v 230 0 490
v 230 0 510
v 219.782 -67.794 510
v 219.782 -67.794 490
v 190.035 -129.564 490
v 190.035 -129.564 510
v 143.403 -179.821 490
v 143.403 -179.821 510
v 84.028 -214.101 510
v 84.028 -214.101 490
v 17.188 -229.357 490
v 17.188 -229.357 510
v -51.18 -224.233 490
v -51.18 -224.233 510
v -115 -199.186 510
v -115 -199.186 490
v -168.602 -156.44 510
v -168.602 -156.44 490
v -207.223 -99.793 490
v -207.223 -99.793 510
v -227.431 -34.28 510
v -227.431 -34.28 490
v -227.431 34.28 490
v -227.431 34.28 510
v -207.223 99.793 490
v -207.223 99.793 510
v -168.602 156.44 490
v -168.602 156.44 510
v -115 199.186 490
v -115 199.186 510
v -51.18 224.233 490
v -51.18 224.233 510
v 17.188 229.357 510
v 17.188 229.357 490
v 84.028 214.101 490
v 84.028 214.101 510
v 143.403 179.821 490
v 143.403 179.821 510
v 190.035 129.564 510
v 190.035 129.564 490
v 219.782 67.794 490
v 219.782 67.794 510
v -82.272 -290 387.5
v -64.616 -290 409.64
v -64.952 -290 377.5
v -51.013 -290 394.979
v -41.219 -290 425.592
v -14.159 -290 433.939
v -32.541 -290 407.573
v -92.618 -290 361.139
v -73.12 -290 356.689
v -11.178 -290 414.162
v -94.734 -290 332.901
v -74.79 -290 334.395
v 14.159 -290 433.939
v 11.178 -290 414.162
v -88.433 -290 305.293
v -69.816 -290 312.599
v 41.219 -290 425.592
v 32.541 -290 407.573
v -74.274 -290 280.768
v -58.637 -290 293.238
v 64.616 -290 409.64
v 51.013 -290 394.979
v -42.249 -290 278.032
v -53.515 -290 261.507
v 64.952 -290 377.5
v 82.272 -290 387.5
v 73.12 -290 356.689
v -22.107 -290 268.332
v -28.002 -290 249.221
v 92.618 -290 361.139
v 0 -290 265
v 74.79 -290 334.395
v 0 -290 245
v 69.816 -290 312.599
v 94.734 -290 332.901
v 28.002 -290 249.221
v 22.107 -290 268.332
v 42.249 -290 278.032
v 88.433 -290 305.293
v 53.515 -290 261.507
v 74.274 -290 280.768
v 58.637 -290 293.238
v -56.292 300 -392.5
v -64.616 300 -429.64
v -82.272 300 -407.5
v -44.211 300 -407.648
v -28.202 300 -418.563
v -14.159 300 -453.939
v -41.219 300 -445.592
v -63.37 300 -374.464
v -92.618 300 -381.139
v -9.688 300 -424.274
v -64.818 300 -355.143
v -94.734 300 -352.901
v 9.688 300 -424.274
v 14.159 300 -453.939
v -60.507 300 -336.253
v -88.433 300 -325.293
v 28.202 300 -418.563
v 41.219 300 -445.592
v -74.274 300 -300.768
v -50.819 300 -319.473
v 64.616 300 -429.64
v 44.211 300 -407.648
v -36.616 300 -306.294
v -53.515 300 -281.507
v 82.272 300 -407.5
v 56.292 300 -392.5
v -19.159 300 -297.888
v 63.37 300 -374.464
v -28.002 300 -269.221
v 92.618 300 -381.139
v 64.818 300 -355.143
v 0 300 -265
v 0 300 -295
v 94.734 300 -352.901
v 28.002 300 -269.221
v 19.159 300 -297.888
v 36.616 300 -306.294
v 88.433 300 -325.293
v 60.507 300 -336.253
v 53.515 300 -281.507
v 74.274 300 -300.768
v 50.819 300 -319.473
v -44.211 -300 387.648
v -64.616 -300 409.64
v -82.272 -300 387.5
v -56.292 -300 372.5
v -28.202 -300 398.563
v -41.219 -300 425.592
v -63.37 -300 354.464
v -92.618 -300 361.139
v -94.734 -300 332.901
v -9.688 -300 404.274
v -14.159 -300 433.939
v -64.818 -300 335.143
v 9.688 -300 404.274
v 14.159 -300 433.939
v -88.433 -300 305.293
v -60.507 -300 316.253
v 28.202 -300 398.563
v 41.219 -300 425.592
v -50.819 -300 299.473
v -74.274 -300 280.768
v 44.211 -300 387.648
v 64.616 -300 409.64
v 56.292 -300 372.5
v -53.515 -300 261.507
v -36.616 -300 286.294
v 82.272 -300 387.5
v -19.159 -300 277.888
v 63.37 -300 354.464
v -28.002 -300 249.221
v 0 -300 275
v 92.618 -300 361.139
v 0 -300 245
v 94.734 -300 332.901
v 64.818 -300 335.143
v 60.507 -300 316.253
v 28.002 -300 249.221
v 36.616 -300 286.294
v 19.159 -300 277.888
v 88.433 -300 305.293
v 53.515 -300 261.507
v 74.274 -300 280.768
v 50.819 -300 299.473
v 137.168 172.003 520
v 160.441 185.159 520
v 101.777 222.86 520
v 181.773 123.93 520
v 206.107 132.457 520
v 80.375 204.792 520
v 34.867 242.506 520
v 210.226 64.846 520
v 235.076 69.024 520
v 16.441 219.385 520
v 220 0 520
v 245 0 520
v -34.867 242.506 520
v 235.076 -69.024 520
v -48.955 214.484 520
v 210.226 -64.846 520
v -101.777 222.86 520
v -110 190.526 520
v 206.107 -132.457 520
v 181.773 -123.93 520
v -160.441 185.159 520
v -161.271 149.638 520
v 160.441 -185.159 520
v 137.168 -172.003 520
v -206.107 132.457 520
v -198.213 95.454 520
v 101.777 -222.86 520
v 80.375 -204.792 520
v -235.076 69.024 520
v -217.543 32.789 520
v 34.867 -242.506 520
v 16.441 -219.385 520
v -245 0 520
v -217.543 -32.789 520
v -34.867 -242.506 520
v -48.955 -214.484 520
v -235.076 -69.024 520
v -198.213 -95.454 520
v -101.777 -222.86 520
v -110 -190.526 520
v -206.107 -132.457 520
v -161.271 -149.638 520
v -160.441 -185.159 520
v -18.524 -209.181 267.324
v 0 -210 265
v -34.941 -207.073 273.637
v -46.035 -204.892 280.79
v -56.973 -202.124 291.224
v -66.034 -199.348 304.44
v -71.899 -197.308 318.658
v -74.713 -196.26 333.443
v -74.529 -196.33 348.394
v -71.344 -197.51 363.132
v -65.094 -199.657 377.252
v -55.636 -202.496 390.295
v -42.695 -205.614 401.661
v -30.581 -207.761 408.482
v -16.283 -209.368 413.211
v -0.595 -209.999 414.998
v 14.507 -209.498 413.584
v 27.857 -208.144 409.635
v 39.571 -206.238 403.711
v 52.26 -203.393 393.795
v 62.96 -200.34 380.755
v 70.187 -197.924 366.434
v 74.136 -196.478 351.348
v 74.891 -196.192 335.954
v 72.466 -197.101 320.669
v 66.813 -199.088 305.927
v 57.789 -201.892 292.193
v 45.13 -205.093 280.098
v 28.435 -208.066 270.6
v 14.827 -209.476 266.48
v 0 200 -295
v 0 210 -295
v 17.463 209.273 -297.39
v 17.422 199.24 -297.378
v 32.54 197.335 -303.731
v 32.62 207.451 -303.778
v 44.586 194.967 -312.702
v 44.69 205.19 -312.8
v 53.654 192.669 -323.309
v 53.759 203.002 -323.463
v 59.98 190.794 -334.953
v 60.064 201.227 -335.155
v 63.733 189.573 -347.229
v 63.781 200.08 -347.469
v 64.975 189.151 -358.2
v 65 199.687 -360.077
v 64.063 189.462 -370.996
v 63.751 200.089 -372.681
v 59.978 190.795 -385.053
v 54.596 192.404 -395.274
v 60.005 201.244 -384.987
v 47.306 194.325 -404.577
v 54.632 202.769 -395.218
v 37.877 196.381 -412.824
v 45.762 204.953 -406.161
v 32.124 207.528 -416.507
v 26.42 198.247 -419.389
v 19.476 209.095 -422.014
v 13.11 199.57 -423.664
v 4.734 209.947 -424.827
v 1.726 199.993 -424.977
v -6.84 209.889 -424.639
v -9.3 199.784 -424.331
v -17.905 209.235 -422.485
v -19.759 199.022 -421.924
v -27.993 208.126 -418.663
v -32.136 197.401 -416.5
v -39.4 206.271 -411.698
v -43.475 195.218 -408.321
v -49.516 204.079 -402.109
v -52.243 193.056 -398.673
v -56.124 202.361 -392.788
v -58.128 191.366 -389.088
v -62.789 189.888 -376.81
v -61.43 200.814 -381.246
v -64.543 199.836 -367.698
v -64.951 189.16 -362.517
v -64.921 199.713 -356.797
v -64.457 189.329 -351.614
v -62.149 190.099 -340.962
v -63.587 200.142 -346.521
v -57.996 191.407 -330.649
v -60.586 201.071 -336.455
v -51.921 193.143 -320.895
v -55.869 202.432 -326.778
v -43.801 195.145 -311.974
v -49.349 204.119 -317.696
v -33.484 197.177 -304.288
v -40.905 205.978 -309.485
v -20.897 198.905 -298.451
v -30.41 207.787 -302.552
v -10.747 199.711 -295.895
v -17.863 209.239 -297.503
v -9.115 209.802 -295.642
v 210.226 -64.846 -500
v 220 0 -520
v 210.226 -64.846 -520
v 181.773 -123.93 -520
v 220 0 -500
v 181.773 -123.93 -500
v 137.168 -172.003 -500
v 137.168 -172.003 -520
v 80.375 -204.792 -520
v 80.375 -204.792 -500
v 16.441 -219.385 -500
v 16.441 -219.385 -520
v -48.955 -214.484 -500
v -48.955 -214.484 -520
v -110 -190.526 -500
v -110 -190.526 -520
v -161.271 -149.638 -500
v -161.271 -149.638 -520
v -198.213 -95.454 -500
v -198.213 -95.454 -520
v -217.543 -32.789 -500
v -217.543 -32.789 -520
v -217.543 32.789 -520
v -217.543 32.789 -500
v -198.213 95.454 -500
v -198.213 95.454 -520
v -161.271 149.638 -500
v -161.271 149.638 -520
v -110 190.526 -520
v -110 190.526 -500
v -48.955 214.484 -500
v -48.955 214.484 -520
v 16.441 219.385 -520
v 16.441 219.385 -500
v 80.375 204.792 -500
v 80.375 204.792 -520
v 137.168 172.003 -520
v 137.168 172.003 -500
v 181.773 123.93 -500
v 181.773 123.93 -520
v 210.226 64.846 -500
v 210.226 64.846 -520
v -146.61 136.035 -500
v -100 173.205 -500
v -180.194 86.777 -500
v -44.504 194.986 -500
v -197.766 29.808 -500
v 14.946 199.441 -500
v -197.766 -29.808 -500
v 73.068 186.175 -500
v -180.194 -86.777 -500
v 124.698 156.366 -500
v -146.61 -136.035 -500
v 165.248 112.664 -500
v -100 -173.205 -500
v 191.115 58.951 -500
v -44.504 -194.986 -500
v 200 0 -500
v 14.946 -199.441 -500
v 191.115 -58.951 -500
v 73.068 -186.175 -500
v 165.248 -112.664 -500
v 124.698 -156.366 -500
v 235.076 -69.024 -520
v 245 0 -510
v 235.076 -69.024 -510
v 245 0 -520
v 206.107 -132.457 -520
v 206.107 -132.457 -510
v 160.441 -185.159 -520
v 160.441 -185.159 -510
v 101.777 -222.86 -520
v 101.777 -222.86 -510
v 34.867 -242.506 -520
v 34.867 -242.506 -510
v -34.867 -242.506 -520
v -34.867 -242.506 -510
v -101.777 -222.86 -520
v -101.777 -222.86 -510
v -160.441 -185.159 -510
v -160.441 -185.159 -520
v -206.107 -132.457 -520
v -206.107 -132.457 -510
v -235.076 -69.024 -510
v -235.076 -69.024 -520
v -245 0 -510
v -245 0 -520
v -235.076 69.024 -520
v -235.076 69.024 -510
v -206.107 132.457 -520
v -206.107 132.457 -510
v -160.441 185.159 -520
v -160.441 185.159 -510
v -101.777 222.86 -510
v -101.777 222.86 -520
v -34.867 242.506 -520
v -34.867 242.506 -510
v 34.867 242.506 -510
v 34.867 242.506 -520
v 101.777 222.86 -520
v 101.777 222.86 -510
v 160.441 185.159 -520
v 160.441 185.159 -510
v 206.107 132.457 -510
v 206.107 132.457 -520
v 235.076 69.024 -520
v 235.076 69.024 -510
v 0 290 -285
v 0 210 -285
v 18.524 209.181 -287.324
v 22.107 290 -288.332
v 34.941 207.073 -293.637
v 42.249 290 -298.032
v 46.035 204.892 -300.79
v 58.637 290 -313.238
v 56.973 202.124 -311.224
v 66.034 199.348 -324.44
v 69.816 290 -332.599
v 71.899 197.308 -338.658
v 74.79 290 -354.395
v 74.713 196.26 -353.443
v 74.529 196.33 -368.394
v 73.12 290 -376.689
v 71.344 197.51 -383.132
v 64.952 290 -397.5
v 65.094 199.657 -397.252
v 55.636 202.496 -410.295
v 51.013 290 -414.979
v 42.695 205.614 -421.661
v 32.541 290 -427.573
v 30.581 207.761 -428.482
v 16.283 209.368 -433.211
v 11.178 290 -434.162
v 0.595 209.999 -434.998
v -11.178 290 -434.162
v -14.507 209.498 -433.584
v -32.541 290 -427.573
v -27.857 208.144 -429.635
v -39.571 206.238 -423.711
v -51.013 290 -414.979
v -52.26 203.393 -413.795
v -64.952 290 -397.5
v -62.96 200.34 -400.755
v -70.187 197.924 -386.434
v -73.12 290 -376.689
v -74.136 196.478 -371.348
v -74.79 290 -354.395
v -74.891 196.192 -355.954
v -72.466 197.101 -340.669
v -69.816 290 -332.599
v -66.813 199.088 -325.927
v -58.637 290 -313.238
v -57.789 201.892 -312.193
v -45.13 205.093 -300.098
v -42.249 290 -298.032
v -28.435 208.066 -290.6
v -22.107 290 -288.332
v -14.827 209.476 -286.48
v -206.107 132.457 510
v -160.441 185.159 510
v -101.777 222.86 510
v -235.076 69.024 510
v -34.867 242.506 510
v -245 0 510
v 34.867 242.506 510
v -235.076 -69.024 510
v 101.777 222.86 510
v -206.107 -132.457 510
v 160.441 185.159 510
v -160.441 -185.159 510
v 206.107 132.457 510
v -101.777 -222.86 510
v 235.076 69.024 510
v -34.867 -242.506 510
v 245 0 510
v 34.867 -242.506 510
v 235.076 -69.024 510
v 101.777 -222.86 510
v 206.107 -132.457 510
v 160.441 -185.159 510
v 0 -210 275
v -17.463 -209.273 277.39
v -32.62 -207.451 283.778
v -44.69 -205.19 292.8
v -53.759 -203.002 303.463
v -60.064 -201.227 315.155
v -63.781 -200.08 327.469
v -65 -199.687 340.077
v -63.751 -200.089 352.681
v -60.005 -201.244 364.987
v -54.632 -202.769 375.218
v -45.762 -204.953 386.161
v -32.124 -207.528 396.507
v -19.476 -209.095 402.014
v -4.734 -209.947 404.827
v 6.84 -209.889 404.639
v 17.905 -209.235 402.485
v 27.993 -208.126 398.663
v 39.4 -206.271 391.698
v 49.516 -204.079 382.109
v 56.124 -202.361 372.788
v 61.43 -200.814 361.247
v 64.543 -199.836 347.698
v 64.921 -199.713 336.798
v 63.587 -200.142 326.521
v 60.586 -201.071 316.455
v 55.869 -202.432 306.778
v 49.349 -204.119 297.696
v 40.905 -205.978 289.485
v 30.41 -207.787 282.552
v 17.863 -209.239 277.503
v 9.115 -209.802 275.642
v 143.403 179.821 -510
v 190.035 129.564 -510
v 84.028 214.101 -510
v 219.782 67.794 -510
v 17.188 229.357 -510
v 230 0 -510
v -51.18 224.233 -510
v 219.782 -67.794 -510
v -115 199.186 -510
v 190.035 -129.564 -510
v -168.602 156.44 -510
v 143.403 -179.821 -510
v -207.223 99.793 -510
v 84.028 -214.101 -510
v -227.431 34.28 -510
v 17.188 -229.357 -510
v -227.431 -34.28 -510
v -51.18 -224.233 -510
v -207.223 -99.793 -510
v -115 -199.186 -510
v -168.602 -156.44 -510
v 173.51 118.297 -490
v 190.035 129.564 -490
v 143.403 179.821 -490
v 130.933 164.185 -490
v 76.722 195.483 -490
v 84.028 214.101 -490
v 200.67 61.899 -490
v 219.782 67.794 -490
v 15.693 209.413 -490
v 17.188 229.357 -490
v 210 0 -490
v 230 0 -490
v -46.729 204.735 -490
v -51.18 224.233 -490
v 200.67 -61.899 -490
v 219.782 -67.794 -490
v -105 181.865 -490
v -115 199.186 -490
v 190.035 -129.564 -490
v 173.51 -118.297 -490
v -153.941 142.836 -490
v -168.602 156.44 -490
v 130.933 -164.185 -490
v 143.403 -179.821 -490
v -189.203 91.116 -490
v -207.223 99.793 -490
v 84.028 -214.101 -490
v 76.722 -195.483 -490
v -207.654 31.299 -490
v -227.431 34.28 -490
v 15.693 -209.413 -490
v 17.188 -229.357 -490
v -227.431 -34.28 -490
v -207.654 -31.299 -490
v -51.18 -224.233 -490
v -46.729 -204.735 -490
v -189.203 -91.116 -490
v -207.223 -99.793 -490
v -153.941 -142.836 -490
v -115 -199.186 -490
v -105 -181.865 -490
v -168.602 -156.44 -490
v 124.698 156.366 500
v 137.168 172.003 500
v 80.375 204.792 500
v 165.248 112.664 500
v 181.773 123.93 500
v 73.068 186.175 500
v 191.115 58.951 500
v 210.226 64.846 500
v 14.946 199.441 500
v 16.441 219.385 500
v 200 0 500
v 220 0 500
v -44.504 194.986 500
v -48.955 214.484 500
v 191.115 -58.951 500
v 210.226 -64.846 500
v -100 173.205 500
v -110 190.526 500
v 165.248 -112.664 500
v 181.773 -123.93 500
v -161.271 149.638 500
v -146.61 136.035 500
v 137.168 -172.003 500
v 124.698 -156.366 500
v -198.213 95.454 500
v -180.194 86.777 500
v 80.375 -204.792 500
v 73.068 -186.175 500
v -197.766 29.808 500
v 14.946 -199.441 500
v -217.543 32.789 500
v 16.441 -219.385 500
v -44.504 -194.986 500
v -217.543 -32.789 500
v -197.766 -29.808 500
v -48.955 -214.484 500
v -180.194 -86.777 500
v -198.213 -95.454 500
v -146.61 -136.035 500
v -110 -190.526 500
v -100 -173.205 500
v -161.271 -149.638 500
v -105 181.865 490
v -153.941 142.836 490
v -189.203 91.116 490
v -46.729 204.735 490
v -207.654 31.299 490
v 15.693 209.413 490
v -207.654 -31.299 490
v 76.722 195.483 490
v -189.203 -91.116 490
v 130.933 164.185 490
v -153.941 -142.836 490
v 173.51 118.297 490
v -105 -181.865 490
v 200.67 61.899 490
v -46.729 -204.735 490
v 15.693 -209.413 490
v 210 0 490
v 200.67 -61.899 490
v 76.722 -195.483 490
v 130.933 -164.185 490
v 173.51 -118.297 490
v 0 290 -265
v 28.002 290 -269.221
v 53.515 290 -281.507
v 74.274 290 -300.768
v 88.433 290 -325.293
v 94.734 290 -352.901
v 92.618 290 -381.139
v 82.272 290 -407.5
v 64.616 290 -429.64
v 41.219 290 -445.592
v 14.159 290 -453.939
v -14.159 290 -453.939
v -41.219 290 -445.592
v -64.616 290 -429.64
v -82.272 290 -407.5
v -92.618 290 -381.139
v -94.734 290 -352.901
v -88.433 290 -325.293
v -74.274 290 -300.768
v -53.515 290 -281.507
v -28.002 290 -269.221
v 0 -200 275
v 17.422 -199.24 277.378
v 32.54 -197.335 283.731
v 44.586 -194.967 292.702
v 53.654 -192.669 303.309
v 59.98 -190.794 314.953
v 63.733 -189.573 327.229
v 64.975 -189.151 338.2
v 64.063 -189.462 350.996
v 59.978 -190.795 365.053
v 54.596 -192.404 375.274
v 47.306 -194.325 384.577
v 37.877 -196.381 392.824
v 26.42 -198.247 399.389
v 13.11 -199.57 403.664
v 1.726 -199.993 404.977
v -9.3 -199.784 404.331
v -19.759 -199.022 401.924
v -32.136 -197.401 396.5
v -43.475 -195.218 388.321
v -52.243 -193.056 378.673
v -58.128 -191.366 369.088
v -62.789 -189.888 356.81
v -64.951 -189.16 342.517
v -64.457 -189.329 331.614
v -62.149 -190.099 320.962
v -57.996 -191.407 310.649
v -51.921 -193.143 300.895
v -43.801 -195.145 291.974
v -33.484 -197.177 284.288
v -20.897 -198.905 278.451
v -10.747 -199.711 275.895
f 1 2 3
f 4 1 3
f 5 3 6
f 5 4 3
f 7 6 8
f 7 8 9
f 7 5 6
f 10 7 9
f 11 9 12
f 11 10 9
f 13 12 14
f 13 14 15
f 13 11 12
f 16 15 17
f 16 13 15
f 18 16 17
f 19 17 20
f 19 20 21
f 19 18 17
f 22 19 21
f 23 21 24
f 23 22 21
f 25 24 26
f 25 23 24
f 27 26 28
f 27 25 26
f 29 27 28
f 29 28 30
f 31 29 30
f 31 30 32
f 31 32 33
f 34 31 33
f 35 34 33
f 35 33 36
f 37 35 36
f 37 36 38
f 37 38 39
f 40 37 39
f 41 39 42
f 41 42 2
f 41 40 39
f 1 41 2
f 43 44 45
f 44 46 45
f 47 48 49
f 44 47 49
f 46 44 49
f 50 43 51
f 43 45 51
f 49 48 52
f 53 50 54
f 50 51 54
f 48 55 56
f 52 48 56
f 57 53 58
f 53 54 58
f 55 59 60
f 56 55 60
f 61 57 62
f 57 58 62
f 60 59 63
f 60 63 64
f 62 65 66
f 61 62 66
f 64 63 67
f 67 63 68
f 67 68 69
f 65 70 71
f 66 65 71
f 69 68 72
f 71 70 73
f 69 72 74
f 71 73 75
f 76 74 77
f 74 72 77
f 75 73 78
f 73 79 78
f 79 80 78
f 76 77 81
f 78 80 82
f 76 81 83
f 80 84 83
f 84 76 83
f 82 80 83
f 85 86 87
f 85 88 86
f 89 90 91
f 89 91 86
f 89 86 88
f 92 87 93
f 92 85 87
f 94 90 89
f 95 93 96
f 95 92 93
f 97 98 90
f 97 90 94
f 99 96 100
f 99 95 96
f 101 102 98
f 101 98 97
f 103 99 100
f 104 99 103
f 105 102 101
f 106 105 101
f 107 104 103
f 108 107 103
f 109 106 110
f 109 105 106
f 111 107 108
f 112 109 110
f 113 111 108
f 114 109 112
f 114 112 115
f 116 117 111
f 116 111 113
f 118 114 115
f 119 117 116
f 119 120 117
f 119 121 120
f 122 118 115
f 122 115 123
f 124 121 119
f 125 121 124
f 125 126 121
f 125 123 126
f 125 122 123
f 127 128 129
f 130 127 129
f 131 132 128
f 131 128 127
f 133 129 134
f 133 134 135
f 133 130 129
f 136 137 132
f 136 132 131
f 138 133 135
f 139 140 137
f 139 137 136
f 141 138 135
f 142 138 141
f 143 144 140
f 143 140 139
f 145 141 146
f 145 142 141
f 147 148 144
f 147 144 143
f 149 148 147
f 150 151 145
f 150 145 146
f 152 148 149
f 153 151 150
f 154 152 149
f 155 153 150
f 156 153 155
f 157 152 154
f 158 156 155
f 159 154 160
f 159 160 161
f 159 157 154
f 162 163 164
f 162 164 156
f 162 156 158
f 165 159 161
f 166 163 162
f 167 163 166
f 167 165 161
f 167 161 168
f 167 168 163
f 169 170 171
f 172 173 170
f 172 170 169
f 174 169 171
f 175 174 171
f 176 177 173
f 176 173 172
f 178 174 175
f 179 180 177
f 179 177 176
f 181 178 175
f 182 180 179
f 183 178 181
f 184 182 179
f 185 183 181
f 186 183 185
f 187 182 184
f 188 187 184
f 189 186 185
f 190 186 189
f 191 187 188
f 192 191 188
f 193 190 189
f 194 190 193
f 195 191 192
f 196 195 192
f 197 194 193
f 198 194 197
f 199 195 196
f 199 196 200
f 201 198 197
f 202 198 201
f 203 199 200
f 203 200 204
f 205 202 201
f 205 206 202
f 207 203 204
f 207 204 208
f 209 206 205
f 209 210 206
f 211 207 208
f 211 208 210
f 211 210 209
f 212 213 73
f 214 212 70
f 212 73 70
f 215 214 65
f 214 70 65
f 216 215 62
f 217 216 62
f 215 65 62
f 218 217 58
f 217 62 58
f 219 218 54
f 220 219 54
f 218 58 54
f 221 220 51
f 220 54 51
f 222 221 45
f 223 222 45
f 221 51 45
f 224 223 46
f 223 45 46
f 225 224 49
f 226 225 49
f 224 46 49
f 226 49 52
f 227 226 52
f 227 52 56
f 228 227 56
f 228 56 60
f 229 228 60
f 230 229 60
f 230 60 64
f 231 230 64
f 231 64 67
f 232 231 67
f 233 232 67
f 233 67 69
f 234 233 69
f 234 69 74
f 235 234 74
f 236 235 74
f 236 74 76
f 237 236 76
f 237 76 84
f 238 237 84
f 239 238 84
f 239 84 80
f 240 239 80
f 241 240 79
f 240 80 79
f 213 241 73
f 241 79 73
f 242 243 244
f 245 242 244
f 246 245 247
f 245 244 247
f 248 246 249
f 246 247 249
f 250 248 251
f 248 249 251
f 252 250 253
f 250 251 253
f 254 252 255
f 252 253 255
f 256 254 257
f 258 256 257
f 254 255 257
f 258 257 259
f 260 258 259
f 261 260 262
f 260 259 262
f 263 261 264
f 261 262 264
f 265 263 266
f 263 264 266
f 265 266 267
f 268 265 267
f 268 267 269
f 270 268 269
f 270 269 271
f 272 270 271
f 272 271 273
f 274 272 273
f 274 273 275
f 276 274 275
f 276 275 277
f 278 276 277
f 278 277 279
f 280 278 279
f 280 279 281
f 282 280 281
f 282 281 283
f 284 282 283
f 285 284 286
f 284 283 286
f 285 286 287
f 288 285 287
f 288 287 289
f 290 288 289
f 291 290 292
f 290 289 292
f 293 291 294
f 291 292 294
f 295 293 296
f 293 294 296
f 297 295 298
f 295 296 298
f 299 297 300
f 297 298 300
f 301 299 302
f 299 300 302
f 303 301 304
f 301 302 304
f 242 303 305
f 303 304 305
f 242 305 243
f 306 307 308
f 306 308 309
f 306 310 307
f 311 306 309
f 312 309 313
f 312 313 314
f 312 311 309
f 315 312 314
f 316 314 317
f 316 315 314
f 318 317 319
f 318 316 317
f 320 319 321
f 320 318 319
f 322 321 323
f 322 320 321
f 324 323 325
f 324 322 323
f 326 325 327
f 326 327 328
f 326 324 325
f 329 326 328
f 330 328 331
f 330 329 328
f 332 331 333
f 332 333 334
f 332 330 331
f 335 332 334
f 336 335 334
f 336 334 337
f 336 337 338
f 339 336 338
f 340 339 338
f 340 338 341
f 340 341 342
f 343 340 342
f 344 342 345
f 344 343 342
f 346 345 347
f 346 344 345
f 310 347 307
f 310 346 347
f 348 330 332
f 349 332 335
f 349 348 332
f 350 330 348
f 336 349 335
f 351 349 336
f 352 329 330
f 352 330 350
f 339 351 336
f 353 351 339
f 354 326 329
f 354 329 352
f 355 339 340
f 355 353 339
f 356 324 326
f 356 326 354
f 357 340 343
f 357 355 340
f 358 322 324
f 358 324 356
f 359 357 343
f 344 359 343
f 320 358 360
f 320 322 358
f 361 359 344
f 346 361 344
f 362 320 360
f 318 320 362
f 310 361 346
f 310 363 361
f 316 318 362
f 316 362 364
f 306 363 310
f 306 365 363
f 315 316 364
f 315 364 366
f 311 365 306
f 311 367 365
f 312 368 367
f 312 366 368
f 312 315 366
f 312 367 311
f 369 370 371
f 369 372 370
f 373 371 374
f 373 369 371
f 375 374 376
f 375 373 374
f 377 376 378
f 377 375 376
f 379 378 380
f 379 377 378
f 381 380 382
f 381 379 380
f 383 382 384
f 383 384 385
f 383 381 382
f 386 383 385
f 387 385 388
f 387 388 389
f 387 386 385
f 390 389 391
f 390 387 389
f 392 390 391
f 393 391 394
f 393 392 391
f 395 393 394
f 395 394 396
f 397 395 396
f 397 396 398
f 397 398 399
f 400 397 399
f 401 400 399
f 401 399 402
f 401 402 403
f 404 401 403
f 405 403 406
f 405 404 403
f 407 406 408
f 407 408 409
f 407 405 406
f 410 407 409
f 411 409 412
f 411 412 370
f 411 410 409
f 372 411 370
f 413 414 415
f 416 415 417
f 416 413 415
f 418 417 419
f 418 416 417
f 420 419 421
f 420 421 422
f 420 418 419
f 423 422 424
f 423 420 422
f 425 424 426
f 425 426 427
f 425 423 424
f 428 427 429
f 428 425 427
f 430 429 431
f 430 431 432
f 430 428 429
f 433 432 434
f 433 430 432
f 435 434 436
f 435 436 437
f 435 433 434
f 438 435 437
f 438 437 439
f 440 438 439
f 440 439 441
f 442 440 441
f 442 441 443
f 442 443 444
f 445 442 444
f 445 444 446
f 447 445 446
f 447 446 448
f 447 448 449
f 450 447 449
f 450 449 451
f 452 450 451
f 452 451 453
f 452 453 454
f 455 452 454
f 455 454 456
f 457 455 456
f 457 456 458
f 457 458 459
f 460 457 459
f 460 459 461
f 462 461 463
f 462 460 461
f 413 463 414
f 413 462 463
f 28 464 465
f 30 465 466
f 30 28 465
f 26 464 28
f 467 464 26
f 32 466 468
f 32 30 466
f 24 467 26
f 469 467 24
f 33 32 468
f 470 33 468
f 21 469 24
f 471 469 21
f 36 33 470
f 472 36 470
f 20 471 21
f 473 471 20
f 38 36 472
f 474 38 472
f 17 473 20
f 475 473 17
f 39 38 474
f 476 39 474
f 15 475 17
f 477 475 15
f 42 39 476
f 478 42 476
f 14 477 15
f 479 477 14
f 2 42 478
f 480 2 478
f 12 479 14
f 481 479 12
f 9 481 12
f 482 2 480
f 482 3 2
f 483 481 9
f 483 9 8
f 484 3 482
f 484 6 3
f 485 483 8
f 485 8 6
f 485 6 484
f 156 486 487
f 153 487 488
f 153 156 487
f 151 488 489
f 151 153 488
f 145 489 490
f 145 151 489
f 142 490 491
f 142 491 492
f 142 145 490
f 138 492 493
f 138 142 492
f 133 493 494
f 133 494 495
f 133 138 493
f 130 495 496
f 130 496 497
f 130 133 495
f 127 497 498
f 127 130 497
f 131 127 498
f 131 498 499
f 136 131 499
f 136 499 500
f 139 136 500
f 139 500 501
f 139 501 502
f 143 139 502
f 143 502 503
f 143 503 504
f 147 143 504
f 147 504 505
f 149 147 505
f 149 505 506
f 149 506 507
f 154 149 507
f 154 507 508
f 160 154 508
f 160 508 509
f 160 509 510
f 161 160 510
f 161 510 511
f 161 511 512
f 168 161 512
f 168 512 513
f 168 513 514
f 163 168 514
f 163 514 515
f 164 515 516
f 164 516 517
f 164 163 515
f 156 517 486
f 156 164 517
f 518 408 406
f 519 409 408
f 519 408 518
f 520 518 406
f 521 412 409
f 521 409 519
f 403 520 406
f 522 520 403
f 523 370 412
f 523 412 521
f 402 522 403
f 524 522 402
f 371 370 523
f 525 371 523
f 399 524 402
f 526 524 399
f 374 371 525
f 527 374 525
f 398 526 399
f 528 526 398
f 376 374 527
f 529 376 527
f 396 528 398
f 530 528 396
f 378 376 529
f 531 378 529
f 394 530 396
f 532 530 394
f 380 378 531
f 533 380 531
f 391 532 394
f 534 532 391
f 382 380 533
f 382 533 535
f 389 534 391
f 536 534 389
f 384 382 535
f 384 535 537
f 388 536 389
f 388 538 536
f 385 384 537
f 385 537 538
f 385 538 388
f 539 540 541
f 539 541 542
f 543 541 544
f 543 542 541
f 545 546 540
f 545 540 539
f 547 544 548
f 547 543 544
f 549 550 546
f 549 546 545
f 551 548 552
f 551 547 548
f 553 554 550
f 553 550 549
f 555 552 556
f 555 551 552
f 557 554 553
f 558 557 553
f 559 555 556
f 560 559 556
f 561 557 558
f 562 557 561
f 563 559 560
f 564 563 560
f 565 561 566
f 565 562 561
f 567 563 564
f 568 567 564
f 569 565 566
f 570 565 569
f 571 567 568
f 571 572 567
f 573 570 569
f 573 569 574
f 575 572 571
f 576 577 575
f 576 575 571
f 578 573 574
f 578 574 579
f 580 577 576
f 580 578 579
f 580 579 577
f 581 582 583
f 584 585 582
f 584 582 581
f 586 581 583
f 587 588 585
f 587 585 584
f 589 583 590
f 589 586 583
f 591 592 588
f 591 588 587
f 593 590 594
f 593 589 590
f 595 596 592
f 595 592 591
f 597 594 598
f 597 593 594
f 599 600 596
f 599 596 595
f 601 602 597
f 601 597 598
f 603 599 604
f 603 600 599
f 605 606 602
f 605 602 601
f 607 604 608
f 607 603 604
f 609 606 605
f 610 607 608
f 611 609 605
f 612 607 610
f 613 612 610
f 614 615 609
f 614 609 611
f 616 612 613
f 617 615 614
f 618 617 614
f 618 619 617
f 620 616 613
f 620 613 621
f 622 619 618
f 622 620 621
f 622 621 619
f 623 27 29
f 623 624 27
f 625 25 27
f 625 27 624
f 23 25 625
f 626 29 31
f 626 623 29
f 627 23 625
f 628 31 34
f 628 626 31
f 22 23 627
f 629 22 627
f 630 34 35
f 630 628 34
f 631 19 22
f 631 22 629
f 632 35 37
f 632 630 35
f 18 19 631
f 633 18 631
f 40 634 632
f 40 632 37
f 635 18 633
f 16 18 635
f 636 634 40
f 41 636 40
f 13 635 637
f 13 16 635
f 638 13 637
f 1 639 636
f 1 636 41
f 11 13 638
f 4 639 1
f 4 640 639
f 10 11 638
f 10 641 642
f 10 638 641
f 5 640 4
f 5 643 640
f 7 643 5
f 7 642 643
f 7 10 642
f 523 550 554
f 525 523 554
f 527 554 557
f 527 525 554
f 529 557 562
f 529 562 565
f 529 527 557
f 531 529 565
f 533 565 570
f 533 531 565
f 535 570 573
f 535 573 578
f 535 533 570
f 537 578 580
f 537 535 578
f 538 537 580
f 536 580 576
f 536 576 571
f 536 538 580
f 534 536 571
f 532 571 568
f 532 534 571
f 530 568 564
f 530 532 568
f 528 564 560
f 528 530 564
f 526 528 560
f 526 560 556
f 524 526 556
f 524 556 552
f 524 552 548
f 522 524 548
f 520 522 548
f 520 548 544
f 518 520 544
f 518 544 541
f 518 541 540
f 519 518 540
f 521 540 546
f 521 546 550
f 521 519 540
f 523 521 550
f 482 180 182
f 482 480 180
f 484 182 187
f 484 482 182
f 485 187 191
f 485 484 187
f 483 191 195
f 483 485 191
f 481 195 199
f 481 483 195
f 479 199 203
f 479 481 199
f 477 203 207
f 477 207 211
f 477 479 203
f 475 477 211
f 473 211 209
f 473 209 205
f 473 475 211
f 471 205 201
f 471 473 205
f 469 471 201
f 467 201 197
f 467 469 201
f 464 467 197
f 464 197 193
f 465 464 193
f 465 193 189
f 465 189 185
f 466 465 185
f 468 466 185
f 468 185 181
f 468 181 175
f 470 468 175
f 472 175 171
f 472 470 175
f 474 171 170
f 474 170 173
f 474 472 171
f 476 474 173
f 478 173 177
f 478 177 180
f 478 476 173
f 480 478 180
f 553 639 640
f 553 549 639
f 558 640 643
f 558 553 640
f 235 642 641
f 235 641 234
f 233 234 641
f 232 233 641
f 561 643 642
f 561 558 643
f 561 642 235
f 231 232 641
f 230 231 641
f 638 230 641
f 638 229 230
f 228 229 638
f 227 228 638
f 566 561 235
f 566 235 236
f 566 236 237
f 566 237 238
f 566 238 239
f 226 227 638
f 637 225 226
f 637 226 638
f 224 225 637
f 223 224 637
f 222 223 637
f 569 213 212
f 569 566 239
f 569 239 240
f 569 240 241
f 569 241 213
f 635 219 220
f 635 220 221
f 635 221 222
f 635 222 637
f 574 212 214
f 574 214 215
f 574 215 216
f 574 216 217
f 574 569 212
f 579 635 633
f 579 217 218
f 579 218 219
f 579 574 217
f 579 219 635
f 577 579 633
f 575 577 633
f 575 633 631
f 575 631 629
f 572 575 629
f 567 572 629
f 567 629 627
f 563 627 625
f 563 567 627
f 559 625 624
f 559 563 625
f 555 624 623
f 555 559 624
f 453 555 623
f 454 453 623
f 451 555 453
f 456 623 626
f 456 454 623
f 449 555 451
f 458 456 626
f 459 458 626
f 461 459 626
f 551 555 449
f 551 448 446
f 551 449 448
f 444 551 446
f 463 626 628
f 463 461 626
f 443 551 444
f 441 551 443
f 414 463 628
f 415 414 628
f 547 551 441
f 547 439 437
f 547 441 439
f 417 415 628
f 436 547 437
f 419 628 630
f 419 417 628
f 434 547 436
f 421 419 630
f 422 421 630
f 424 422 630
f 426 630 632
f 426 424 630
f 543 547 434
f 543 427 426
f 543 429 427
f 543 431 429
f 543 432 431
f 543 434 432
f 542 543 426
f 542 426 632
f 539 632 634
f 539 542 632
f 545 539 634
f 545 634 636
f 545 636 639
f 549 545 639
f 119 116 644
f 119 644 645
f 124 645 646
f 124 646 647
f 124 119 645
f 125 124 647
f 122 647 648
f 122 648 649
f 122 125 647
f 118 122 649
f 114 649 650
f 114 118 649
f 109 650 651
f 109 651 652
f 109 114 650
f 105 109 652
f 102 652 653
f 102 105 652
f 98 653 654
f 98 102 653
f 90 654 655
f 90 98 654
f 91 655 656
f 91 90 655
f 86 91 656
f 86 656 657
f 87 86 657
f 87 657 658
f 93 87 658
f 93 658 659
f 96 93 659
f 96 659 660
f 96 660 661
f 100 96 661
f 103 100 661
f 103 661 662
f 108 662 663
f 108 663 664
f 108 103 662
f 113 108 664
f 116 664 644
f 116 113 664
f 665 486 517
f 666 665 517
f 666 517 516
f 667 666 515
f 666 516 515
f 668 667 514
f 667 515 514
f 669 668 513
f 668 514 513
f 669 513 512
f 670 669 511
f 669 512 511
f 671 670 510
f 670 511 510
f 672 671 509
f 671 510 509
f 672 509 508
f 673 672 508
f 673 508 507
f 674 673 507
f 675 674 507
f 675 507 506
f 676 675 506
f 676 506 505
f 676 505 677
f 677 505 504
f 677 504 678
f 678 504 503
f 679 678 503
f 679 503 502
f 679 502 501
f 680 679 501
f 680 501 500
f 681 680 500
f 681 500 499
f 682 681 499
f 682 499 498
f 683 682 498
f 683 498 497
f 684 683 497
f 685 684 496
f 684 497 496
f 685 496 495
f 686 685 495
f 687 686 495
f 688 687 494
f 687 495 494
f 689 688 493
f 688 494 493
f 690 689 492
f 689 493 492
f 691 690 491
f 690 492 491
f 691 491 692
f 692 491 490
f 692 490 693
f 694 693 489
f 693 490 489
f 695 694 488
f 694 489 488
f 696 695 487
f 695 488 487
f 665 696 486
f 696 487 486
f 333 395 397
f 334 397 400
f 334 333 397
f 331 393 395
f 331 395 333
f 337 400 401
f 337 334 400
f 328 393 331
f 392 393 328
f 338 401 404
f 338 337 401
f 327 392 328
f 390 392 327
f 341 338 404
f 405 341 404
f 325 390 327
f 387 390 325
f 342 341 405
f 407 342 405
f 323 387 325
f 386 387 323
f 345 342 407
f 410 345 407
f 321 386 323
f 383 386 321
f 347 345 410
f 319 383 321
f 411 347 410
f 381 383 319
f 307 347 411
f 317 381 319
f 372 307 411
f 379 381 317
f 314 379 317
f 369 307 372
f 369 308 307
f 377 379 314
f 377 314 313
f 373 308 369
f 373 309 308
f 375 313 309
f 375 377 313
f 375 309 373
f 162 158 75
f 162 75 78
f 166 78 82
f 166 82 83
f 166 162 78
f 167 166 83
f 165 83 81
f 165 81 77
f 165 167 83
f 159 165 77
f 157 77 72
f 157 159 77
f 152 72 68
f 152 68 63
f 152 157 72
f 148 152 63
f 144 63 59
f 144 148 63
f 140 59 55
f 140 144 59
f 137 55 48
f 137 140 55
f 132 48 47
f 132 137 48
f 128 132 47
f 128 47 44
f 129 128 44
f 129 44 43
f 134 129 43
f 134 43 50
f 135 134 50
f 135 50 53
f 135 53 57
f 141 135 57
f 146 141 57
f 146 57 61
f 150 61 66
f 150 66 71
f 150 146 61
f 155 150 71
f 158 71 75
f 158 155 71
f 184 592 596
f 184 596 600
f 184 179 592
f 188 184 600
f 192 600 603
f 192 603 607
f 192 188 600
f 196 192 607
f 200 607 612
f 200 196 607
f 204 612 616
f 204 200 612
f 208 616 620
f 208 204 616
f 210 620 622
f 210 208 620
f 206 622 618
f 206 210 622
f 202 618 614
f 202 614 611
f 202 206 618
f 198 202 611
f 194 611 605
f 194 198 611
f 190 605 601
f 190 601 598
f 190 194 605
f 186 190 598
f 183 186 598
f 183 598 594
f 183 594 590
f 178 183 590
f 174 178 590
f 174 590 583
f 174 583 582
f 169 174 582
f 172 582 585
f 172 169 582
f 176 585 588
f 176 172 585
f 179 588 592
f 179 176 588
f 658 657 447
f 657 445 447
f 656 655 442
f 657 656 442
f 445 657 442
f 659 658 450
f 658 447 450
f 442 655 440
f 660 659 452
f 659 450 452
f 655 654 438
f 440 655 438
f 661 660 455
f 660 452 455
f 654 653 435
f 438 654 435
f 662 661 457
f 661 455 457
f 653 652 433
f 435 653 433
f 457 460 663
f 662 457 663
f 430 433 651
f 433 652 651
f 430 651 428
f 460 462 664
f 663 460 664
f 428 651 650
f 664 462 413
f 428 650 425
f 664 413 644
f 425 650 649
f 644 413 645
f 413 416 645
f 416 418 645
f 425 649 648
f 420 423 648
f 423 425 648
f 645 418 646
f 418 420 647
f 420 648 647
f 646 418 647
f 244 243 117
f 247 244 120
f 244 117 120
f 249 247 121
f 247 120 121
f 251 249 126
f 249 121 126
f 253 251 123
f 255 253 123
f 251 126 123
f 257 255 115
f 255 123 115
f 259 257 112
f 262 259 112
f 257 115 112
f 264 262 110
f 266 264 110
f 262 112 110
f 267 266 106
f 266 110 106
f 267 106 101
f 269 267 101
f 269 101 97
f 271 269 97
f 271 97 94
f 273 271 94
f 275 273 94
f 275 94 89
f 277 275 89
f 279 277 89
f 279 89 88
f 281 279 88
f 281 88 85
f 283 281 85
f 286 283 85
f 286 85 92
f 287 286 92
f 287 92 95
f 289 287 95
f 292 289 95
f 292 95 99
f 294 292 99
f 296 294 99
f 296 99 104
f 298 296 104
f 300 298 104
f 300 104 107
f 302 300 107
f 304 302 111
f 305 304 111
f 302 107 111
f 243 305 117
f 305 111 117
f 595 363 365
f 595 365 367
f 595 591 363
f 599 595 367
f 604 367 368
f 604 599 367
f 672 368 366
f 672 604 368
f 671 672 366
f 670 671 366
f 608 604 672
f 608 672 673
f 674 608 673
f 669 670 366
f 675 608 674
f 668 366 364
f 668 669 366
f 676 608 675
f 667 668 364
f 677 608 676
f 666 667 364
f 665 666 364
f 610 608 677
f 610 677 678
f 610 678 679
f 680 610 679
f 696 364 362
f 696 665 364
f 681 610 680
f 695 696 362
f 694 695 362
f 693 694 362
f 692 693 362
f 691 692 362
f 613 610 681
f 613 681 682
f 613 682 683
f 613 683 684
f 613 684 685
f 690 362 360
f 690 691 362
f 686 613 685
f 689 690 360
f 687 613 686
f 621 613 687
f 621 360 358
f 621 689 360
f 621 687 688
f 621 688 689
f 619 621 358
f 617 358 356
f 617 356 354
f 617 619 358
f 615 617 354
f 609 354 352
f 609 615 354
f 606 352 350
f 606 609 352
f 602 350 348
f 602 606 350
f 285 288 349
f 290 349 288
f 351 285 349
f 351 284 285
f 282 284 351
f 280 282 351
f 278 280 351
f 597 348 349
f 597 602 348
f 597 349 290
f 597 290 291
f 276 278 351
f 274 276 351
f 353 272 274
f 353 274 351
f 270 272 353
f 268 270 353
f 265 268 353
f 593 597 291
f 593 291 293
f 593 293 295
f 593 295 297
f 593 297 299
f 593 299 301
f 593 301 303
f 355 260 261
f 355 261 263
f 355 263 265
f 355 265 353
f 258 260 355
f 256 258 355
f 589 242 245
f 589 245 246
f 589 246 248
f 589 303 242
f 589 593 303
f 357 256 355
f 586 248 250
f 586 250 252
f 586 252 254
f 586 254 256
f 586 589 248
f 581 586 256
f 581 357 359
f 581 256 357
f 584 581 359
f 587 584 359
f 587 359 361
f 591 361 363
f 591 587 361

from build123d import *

# Parameters (mm, degrees)
BOSS_EXTRUDE4_REACH      = 926.86
BOSS_EXTRUDE4_END_RADIUS = 210
BOSS_EXTRUDE4_START      = 300
SKETCH3_R                = 75
SKETCH3_R_2              = 65
CUT_EXTRUDE2_REACH       = 794.117
SKETCH4_R                = 65
SKETCH6_R                = 95
SKETCH6_R_2              = 65
BOSS_EXTRUDE5_DEPTH      = 10
BOSS_EXTRUDE7_REACH      = 832.918
BOSS_EXTRUDE7_END_RADIUS = 210
SKETCH8_R                = 75
SKETCH8_R_2              = 65
CUT_EXTRUDE3_REACH       = 832.918
SKETCH9_R                = 65
SKETCH10_R               = 95
SKETCH10_R_2             = 75
BOSS_EXTRUDE8_DEPTH      = 10


with BuildPart() as part:
    # Sketch1 → Revolve1 (revolve)
    with BuildSketch(Plane(origin=(0, 0, 0), x_dir=(0, 0, -1), z_dir=(1, 0, 0)), mode=Mode.PRIVATE) as revolve1_sk:
        Polygon((500, 200), (-500, 200), (-500, 220), (-520, 220), (-520, 245), (-510, 245), (-510, 230), (-490, 230), (-490, 210), (490, 210), (490, 230), (510, 230), (510, 245), (520, 245), (520, 220), (500, 220), align=None)
    revolve(revolve1_sk.sketch.rotate(Axis((0, 0, 500), (0, 0, -1)), 90), axis=Axis((0, 0, 500), (0, 0, -1)))

    # Boss-Extrude4: up to this cylinder (the profile starts outside it)
    boss_extrude4_end = Plane(origin=(0, 0, -432.87868), z_dir=(0, 0, 1)) * Cylinder(BOSS_EXTRUDE4_END_RADIUS, 2274.72, mode=Mode.PRIVATE)
    # Sketch3 → Boss-Extrude4 (add, up to the surface)
    with BuildSketch(Plane(origin=(0, 0, 0), x_dir=(1, 0, 0), z_dir=(0, 1, 0)).offset(BOSS_EXTRUDE4_START), mode=Mode.PRIVATE) as boss_extrude4_sk1:
        with Locations(Location((0, 360, 0), (0, 0, 270))):
            Circle(SKETCH3_R)
        with Locations(Location((0, 360, 0), (0, 0, 270))):
            Circle(SKETCH3_R_2, mode=Mode.SUBTRACT)
    boss_extrude4_tool1 = extrude(boss_extrude4_sk1.sketch, amount=-BOSS_EXTRUDE4_REACH, mode=Mode.PRIVATE) - boss_extrude4_end
    add(boss_extrude4_tool1.solids().sort_by_distance((0, 300, -432.87868))[0])

    # Sketch4 → Cut-Extrude2 (cut, up to next)
    with BuildSketch(Plane(origin=(0, 300, 0), x_dir=(1, 0, 0), z_dir=(0, 1, 0)), mode=Mode.PRIVATE) as cut_extrude2_sk1:
        with Locations(Location((0, 360, 0), (0, 0, 270))):
            Circle(SKETCH4_R)
    cut_extrude2_tool1 = extrude(cut_extrude2_sk1.sketch, amount=-CUT_EXTRUDE2_REACH, mode=Mode.PRIVATE) & part.part
    add(cut_extrude2_tool1.solids().sort_by_distance((0, 300, -360))[0], mode=Mode.SUBTRACT)

    # Sketch6 → Boss-Extrude5 (add)
    with BuildSketch(Plane(origin=(0, 300, 0), x_dir=(1, 0, 0), z_dir=(0, 1, 0))):
        with Locations(Location((0, 360, 0), (0, 0, 270))):
            Circle(SKETCH6_R)
        with Locations(Location((0, 360, 0), (0, 0, 270))):
            Circle(SKETCH6_R_2, mode=Mode.SUBTRACT)
    extrude(amount=-BOSS_EXTRUDE5_DEPTH)

    # Boss-Extrude7: up to this cylinder (the profile starts outside it)
    boss_extrude7_end = Plane(origin=(0, 0, 412.87868), z_dir=(0, 0, 1)) * Cylinder(BOSS_EXTRUDE7_END_RADIUS, 2086.836, mode=Mode.PRIVATE)
    # Sketch8 → Boss-Extrude7 (add, up to the surface)
    with BuildSketch(Plane(origin=(0, -300, 0), x_dir=(1, 0, 0), z_dir=(0, 1, 0)), mode=Mode.PRIVATE) as boss_extrude7_sk1:
        with Locations(Location((0, -340, 0), (0, 0, 90))):
            Circle(SKETCH8_R)
        with Locations(Location((0, -340, 0), (0, 0, 90))):
            Circle(SKETCH8_R_2, mode=Mode.SUBTRACT)
    boss_extrude7_tool1 = extrude(boss_extrude7_sk1.sketch, amount=BOSS_EXTRUDE7_REACH, mode=Mode.PRIVATE) - boss_extrude7_end
    add(boss_extrude7_tool1.solids().sort_by_distance((0, -300, 412.87868))[0])

    # Sketch9 → Cut-Extrude3 (cut, up to next)
    with BuildSketch(Plane.XZ.offset(300), mode=Mode.PRIVATE) as cut_extrude3_sk1:
        with Locations(Location((0, 340, 0), (0, 0, 270))):
            Circle(SKETCH9_R)
    cut_extrude3_tool1 = extrude(cut_extrude3_sk1.sketch, amount=-CUT_EXTRUDE3_REACH, mode=Mode.PRIVATE) & part.part
    add(cut_extrude3_tool1.solids().sort_by_distance((0, -300, 340))[0], mode=Mode.SUBTRACT)

    # Sketch10 → Boss-Extrude8 (add)
    with BuildSketch(Plane.XZ.offset(300)):
        with Locations(Location((0, 340, 0), (0, 0, 270))):
            Circle(SKETCH10_R)
        with Locations(Location((0, 340, 0), (0, 0, 270))):
            Circle(SKETCH10_R_2, mode=Mode.SUBTRACT)
    extrude(amount=-BOSS_EXTRUDE8_DEPTH)


solid = part.part
